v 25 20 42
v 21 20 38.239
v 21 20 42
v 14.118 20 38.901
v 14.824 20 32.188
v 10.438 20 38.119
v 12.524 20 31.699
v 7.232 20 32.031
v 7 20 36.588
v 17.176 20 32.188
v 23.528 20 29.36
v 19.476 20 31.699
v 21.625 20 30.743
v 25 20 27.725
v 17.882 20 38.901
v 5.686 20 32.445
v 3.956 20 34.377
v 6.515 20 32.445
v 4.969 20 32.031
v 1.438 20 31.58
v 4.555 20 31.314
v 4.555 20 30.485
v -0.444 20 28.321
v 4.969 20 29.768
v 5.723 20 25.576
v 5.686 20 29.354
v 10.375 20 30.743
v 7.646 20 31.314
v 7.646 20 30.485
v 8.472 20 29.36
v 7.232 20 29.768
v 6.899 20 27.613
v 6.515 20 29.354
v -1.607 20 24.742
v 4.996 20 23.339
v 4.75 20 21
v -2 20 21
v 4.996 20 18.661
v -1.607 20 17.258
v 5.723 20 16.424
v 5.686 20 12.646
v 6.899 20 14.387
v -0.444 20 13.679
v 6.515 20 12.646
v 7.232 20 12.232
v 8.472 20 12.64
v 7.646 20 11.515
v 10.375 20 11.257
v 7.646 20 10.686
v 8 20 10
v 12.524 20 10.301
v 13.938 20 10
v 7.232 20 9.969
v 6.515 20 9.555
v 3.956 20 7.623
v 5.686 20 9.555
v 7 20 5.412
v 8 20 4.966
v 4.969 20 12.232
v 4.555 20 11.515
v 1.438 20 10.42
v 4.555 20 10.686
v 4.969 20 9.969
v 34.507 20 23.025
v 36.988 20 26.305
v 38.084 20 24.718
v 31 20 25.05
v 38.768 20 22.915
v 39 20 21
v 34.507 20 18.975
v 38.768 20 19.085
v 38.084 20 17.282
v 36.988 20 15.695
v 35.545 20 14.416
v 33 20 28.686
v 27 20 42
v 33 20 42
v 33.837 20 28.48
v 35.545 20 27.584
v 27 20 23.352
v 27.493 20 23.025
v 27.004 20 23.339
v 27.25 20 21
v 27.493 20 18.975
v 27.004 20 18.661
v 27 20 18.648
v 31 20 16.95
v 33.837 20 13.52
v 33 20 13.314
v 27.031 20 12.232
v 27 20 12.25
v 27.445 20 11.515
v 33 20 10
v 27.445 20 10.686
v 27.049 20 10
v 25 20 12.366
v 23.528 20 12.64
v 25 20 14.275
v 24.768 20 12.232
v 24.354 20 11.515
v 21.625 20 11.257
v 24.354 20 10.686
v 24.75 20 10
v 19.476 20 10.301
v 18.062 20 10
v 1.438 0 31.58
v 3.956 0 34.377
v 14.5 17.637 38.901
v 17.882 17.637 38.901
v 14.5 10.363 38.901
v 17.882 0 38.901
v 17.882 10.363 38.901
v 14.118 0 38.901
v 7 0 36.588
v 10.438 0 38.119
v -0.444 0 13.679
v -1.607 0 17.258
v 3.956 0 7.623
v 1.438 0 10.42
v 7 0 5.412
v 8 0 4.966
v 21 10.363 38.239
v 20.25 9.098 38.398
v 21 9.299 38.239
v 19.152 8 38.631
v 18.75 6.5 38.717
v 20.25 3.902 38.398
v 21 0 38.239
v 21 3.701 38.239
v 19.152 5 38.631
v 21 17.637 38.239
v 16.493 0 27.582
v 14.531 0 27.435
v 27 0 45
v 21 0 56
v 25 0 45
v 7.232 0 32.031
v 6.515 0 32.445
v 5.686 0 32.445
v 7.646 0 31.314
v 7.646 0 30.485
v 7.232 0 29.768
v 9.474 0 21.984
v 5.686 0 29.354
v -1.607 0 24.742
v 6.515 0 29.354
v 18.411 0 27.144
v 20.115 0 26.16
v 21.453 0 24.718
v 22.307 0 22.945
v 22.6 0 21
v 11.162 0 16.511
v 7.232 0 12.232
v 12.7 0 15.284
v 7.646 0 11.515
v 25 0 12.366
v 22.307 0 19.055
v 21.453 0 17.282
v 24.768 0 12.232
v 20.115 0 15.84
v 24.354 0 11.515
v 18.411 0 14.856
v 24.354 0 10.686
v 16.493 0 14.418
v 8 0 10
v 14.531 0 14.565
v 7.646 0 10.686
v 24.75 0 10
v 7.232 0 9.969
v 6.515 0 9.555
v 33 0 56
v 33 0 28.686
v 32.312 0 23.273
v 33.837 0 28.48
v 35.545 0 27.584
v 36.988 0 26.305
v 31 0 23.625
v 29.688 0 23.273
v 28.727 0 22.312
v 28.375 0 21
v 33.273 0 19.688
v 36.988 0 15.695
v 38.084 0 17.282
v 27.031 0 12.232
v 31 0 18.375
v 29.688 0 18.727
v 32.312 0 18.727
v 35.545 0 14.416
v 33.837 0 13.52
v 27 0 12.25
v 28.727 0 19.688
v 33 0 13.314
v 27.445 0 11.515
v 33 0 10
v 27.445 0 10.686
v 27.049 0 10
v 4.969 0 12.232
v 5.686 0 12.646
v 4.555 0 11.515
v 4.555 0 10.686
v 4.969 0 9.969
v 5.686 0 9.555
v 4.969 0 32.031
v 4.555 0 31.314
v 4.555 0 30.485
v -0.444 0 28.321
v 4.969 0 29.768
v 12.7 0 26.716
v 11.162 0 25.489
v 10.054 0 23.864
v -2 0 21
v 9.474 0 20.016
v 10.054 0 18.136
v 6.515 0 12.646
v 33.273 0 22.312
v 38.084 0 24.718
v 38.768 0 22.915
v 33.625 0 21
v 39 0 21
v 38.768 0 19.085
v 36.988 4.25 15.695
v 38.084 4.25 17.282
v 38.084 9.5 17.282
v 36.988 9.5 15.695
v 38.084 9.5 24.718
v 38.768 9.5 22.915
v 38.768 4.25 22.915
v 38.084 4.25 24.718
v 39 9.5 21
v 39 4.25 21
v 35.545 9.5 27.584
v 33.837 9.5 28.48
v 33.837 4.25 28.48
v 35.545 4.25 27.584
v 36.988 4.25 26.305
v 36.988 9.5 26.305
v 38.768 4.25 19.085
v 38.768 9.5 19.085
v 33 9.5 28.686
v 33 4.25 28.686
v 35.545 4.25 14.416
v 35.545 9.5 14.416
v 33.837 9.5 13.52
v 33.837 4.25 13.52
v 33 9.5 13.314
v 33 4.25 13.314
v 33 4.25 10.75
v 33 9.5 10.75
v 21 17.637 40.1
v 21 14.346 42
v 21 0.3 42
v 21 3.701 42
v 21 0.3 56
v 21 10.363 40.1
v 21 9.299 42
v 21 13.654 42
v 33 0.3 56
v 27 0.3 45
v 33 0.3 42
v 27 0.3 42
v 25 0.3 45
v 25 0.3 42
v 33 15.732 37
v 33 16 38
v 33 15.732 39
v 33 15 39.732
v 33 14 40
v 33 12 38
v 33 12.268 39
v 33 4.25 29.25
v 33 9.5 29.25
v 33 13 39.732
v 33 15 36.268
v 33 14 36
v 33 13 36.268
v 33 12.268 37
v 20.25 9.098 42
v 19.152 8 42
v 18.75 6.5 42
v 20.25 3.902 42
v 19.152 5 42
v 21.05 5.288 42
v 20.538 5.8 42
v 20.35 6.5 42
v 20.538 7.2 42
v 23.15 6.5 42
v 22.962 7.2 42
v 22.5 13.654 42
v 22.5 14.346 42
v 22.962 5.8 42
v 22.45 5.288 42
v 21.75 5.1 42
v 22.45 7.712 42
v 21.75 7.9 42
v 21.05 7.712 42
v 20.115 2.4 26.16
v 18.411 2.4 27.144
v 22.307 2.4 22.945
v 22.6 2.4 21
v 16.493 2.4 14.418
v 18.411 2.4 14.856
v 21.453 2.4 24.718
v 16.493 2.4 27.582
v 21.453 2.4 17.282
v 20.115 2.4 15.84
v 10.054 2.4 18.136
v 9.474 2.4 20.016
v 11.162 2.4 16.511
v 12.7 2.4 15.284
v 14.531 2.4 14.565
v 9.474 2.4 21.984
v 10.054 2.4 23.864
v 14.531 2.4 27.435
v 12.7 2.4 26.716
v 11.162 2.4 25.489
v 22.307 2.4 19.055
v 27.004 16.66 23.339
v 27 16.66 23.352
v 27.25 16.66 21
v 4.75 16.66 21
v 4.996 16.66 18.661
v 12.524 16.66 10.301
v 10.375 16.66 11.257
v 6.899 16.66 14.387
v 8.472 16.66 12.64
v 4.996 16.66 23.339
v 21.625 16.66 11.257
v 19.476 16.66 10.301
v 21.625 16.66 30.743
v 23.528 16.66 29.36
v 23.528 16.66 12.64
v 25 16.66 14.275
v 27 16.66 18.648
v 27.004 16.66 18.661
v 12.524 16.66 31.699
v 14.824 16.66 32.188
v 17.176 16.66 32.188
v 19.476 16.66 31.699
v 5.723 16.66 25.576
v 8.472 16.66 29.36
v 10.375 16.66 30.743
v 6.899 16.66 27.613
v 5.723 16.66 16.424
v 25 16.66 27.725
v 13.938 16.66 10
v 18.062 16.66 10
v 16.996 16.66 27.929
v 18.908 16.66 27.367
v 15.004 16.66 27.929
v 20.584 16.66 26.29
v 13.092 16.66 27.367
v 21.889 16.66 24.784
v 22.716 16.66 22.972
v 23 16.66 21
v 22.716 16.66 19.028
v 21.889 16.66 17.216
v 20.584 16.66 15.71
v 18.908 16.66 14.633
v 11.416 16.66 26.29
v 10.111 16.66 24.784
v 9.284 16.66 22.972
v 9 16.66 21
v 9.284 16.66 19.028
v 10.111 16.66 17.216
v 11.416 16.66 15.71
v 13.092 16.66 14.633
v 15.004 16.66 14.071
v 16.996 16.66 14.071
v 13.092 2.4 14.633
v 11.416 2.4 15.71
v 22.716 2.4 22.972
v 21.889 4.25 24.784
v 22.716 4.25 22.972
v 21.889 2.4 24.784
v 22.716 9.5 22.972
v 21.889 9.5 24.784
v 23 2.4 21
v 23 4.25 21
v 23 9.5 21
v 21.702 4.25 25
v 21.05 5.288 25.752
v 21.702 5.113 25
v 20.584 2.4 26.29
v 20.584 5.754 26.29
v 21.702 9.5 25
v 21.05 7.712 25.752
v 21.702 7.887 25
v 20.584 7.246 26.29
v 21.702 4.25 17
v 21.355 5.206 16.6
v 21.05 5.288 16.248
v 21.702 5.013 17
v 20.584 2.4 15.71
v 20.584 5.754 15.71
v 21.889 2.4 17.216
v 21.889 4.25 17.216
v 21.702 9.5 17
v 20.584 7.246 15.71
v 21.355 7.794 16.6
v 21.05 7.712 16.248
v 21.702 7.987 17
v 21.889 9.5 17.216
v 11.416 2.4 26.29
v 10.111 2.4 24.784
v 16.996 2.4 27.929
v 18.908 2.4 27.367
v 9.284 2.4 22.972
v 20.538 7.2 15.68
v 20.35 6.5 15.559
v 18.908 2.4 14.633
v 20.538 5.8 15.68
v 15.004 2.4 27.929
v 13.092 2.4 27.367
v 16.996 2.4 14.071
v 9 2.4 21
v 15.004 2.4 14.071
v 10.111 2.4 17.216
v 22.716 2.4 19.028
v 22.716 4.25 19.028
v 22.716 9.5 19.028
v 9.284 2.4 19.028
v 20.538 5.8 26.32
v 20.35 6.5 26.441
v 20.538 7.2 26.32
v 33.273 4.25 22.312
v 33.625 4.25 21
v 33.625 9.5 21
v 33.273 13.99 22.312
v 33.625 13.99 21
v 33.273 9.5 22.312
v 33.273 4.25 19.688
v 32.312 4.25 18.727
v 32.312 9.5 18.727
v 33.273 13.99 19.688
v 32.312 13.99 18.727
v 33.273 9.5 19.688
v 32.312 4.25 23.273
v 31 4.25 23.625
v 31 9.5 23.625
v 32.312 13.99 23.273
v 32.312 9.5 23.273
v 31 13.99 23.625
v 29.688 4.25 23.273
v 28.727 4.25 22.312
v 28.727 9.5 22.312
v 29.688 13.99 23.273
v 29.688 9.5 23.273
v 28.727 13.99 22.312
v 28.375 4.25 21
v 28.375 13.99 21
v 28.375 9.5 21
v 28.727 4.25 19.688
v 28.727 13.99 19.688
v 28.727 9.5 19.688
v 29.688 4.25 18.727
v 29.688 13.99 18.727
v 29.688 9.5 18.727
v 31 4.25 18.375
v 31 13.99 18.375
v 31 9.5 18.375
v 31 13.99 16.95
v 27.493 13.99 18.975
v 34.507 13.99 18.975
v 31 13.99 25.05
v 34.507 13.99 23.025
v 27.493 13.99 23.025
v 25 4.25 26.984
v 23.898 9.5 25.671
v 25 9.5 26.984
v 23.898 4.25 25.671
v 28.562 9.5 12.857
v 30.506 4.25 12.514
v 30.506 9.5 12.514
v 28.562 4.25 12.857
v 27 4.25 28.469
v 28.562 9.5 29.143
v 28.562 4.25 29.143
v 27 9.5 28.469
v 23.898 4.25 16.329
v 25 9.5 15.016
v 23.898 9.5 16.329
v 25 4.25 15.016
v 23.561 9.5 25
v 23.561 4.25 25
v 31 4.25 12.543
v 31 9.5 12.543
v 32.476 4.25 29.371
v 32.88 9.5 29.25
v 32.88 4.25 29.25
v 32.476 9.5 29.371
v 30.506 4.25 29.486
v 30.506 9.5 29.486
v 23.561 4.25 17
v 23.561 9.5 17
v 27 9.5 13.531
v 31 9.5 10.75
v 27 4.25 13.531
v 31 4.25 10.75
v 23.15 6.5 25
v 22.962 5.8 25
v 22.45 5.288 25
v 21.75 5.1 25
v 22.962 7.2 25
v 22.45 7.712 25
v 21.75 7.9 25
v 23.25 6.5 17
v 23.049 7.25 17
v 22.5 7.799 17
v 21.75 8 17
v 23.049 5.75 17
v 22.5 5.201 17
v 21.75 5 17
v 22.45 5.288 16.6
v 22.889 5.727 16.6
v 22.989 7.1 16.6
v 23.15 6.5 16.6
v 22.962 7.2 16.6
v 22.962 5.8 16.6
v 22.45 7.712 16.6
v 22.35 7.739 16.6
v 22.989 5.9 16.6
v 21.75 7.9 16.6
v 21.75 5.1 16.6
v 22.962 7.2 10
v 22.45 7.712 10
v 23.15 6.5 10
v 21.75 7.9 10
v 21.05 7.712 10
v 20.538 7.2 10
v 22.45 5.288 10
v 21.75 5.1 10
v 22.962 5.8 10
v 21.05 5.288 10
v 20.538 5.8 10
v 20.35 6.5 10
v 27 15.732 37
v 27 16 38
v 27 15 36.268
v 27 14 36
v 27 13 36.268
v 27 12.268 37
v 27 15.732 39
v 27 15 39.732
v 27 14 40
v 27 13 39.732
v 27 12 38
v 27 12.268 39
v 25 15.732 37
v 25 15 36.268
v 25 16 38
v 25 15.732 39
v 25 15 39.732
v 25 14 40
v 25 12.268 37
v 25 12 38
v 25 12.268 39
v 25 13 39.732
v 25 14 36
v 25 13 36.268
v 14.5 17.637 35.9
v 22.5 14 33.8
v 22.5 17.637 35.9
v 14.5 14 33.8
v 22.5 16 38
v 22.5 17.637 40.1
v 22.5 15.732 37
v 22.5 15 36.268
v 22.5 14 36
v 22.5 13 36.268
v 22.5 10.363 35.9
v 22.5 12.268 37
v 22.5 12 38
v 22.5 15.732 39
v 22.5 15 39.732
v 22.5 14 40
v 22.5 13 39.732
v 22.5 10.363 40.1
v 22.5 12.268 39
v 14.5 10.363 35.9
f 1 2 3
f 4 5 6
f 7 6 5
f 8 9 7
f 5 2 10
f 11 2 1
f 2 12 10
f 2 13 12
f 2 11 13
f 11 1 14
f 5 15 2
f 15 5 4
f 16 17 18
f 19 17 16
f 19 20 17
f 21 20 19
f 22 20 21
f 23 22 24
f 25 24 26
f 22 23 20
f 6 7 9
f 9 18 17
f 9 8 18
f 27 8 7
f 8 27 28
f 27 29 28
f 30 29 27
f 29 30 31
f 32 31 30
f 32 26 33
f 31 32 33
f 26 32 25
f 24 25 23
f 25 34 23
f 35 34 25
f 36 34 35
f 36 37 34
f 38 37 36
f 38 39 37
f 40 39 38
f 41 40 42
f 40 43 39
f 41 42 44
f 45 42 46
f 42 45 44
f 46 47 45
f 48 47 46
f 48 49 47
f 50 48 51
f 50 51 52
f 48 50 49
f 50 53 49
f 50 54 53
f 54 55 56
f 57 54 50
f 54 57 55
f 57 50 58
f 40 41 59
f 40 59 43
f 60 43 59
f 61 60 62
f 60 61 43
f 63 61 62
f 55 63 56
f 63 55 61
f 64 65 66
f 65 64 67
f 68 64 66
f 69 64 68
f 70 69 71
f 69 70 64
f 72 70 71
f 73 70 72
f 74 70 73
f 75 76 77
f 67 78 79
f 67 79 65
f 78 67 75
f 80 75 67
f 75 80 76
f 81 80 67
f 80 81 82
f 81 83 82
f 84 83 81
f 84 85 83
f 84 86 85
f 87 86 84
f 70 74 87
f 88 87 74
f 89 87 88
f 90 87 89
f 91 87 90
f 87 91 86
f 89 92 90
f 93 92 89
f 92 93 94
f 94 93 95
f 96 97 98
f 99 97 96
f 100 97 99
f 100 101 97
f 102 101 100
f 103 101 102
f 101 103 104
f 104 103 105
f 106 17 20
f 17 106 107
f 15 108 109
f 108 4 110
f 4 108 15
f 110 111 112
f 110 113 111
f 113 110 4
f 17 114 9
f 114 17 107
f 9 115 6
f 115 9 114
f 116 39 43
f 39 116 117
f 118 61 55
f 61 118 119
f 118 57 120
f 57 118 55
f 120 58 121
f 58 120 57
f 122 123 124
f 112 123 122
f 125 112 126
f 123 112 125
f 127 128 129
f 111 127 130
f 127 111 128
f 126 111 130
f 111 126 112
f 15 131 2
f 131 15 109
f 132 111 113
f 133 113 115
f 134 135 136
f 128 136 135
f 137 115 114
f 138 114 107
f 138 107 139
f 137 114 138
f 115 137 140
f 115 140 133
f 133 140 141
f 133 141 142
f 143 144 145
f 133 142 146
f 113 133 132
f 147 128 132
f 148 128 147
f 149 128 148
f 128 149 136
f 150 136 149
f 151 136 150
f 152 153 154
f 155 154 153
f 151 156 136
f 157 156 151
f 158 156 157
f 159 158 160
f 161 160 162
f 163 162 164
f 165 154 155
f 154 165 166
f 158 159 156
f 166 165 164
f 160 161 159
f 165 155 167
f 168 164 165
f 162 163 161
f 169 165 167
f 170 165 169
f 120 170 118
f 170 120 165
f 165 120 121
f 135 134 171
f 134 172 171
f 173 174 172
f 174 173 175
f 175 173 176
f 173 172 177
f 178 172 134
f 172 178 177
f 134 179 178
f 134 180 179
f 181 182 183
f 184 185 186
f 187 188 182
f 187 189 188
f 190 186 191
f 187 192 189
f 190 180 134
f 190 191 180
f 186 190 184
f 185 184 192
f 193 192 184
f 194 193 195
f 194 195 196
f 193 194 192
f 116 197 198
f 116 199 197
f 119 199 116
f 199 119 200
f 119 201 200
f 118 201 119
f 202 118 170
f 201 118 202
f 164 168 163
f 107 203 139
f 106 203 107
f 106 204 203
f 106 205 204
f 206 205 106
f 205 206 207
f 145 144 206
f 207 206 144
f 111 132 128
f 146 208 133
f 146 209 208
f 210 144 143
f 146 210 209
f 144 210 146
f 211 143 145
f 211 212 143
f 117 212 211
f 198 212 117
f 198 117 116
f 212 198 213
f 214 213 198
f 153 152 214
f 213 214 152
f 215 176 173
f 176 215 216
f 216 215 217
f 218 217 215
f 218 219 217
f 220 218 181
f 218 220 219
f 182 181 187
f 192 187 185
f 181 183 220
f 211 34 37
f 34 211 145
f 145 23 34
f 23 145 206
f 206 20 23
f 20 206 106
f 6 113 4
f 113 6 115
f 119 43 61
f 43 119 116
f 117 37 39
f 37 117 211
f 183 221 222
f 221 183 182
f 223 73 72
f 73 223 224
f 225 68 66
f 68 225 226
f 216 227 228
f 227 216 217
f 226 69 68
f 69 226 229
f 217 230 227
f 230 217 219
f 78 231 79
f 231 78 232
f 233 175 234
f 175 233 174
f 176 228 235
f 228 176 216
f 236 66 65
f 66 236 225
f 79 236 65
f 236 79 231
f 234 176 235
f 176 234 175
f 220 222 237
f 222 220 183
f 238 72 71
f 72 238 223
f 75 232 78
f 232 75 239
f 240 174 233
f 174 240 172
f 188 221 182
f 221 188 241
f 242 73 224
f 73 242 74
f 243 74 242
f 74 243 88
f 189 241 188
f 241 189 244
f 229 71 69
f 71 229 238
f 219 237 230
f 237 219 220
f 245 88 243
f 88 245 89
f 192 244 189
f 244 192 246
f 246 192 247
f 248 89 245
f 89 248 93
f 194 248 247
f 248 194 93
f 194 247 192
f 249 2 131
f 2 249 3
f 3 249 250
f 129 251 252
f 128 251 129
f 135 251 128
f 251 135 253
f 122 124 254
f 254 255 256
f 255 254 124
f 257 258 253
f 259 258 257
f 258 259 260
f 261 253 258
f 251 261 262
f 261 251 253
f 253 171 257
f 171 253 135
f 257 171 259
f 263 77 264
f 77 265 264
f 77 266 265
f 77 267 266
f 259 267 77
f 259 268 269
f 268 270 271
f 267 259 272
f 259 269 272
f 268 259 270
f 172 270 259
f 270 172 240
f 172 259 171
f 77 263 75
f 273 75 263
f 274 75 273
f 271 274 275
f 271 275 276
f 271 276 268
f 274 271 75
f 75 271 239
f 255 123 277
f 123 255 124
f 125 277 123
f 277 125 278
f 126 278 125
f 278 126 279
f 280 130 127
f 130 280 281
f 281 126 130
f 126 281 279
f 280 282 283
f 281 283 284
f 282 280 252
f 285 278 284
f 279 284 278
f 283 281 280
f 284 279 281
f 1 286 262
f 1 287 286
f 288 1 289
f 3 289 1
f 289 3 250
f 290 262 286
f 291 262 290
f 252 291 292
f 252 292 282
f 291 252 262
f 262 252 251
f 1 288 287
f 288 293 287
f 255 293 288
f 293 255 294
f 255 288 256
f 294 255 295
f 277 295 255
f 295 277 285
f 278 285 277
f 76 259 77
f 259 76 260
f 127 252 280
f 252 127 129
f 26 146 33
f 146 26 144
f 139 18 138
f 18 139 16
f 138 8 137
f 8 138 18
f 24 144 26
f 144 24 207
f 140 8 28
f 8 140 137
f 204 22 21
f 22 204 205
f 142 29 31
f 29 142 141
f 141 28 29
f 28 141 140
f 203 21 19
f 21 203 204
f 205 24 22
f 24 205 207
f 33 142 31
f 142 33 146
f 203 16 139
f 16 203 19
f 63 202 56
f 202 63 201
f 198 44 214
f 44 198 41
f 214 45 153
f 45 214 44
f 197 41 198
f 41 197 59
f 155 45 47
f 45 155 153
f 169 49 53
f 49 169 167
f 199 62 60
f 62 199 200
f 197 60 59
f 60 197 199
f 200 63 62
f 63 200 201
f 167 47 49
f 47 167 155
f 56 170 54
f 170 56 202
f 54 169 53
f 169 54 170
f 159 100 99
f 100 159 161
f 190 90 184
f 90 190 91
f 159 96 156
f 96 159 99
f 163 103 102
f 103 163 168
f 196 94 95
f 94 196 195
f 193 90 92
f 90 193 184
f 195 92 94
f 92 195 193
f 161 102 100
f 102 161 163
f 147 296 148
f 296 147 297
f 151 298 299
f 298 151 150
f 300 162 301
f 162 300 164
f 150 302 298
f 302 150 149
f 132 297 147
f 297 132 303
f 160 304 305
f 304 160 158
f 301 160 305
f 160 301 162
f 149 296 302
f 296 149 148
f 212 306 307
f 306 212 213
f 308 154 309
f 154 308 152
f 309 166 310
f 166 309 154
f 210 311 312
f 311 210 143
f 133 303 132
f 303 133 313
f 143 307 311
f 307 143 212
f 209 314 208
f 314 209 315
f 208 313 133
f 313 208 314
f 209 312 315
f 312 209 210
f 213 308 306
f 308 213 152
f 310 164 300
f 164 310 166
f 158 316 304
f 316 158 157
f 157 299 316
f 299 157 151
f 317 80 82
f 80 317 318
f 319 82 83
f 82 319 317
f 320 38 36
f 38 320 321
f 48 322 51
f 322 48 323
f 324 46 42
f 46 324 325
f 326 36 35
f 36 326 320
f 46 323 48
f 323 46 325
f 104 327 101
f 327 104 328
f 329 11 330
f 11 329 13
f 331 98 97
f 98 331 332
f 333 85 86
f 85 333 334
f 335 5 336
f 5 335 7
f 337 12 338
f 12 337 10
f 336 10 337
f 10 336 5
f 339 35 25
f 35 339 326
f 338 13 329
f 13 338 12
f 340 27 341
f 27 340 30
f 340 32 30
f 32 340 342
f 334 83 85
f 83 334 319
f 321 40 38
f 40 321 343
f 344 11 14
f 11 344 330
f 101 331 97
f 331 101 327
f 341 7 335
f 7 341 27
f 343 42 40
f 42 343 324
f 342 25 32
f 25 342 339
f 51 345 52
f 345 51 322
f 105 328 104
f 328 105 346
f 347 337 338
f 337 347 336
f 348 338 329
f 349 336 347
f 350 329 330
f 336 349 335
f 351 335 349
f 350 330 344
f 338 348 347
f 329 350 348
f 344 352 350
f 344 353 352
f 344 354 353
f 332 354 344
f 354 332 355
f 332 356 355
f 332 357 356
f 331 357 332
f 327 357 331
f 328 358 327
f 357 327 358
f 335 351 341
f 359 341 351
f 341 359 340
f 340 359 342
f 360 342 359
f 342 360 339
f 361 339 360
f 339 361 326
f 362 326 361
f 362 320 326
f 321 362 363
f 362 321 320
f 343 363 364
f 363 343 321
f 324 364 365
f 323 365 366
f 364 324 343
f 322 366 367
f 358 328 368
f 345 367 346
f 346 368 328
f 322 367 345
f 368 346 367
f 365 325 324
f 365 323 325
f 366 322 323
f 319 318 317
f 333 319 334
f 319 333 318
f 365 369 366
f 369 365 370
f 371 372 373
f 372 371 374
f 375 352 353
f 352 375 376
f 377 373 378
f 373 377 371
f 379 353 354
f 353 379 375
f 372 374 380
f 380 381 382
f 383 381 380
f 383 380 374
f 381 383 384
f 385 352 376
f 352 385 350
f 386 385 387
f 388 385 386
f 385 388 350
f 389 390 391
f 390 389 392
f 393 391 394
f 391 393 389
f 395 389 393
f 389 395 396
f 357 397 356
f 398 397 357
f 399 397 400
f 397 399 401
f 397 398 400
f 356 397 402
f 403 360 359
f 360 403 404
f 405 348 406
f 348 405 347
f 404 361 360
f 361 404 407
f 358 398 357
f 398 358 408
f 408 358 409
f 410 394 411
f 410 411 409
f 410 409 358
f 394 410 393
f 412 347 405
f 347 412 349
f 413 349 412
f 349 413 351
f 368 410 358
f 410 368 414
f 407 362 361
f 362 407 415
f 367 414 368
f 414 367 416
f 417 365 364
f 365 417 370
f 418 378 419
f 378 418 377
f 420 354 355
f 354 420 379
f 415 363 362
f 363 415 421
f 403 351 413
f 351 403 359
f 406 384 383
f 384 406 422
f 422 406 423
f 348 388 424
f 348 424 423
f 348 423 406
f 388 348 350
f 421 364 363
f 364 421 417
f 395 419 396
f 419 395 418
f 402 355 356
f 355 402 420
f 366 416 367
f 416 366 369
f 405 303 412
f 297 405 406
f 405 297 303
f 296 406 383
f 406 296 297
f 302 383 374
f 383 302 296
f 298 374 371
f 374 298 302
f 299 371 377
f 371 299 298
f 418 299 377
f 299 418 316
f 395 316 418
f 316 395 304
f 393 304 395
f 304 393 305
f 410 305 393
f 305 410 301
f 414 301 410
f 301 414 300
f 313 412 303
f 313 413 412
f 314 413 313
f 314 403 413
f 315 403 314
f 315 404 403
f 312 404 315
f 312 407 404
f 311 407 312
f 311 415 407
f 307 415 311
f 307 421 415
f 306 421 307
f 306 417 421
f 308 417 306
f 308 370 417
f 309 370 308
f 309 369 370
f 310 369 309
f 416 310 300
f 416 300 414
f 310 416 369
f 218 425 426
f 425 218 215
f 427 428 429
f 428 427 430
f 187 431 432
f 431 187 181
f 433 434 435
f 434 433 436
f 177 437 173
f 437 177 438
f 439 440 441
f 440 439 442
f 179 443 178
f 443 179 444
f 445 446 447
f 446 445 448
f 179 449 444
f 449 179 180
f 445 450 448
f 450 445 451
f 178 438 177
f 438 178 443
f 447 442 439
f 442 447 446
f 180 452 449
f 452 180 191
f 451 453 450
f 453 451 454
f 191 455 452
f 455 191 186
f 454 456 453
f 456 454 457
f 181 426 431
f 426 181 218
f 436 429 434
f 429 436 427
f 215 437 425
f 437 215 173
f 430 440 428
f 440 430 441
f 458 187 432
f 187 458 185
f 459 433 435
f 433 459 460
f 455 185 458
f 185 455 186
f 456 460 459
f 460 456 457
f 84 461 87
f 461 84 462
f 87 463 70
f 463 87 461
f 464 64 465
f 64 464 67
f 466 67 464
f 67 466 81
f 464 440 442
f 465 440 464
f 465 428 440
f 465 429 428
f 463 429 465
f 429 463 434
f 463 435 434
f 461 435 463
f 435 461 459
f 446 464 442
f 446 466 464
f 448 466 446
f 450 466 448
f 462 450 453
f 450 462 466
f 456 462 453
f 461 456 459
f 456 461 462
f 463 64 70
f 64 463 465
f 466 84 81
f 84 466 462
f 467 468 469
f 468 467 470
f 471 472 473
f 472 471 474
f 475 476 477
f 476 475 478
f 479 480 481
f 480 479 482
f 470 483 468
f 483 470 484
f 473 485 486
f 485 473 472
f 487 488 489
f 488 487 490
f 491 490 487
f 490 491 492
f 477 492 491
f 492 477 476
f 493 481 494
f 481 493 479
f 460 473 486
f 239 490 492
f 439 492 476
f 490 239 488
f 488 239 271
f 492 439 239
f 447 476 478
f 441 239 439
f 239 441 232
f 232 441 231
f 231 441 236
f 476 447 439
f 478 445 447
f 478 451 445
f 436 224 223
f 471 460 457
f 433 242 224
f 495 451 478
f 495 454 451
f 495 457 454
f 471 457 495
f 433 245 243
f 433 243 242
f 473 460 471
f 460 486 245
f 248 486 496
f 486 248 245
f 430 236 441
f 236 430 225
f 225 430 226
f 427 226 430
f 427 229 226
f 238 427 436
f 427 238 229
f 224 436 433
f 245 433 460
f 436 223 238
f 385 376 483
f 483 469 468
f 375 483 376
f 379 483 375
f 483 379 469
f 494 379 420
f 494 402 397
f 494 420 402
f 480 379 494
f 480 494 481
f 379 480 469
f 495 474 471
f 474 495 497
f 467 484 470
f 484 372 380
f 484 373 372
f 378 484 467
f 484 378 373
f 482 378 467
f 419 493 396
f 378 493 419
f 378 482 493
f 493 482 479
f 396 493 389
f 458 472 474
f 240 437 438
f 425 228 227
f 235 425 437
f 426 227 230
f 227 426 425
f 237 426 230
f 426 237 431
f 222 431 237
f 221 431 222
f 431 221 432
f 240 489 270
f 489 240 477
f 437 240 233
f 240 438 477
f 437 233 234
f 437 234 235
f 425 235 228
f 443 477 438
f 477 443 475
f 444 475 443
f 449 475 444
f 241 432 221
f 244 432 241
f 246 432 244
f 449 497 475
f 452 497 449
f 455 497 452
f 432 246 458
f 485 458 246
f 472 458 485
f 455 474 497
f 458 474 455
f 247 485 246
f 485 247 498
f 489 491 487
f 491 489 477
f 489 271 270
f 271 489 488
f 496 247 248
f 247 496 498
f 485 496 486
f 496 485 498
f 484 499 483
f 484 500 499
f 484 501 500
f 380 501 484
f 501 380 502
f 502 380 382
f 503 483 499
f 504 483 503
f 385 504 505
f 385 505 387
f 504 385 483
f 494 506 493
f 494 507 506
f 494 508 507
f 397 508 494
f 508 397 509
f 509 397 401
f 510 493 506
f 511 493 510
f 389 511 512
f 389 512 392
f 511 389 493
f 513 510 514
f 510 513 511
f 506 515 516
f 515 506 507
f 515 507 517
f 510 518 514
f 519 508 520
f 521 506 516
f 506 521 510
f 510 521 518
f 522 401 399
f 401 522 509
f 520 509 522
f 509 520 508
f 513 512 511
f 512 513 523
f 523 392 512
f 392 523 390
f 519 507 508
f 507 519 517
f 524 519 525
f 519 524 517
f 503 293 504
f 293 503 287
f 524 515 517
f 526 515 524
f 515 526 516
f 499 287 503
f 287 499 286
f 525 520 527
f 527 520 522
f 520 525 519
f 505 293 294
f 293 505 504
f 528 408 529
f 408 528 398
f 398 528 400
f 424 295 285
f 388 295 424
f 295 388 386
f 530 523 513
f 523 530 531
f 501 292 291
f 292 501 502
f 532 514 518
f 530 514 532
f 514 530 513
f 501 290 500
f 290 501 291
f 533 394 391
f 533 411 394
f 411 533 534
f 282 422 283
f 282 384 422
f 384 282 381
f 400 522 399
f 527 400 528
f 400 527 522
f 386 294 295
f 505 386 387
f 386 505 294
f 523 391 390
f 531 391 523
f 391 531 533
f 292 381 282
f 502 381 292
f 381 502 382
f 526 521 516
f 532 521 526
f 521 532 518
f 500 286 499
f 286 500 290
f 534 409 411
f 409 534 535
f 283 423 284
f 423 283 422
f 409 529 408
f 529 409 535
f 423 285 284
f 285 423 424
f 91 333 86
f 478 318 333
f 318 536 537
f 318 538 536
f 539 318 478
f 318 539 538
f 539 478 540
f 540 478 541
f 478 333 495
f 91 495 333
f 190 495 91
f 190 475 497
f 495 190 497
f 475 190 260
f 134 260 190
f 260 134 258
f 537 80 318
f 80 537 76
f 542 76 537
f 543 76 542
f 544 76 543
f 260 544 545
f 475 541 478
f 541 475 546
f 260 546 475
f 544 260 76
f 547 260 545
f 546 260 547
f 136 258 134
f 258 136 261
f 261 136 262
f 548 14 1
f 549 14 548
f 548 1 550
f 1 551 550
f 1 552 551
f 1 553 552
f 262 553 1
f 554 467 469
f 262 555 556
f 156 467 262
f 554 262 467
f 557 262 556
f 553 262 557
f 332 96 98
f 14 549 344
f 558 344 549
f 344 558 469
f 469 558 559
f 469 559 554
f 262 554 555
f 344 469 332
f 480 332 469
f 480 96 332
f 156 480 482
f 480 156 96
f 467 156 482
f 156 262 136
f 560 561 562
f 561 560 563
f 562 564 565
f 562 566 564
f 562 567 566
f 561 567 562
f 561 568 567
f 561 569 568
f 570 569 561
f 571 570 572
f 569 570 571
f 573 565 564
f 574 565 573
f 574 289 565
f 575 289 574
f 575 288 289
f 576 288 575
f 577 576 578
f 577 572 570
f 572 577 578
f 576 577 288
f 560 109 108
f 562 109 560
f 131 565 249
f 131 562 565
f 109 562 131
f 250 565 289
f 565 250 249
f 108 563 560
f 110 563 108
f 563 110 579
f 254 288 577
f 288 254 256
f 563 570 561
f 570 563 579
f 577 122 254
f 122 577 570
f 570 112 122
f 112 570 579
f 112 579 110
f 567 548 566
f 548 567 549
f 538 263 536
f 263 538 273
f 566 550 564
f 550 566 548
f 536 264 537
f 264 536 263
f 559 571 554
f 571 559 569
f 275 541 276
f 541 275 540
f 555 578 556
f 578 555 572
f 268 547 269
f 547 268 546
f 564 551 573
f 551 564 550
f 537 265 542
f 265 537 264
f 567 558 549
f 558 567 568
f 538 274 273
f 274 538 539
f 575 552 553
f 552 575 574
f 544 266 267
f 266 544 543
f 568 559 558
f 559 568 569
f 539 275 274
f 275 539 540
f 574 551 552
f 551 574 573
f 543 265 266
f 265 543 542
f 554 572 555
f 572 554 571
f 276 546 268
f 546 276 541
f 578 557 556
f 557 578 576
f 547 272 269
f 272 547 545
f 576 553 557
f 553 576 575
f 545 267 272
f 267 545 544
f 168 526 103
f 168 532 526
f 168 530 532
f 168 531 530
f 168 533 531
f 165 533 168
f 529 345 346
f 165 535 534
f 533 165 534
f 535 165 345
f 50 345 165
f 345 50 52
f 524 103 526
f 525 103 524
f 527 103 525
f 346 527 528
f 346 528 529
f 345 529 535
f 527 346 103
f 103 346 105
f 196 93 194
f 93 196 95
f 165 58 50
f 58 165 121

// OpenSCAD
first_layer = 0.3;

difference() {
	
	union() {
		//main cylinder
		translate([16,20,21]) rotate([90,0,0]) cylinder(h=20, r=18);//cube([44, 20, 42]);
		
		//bearing mount
		translate([31,20,21]) rotate([90,0,0]) cylinder (h=20, r=8);
		
		//V3 Mount
		translate([9,0,-7]) cube([24, 20, 22]);
		translate([21,first_layer/2,-11]) rotate([90,0,0]) cube([24, 22, first_layer], center=true);
		translate([27,first_layer/2,45]) rotate([90,0,0]) cube([12, 22, first_layer], center=true);
		
		//filament support
		translate([21.75,6.5,34]) rotate([0,0,0]) cylinder (h=8, r=3, $fn=12);
		
		//groovemount supports
//		translate([33,6.5,-7]) rotate([0,0,0]) cylinder (h=16, r=5, $fn=12);
//		translate([9,6.5,-7]) rotate([0,0,0]) cylinder (h=16, r=5, $fn=12);
		
		//clamp
		translate([21,0,28]) cube([12, 20, 14]);
	}
	
	//pulley opening
	translate([16,21,21]) rotate([90,0,0]){
		cylinder (h=22, r=6.6);
		
		rotate([0,0,45]) {
		//translate([14,0,0]) cylinder(h=22, r=1.6, $fn=12);
		translate([0,14,0]) cylinder(h=22, r=1.6, $fn=12);
		translate([-14,0,0]) cylinder(h=22, r=1.6, $fn=12);
		translate([0,-14,0]) cylinder(h=22, r=1.6, $fn=12);
		}
	}
	
	//gearhead indentation
	translate([16,20.01,21]) rotate([90,0,0]) cylinder (h=3.35, r=11.25);

	//pulley hub indentation
	translate([16,20-2,21]) rotate([90,0,0]) cylinder (h=15.6, r=7);
	
	//bearing screws
	translate([31,21,21]) rotate([90,0,0]) cylinder (h=22, r=2.625, $fn=12); //precision m5
	//translate([31,21,21]) rotate([90,0,0]) cylinder (h=22, r=2.6, $fn=12); //regular M5 screw
	translate([31,22,21]) rotate([90,30,0]) cylinder (h=8.01, r=8.1/2, $fn=6); //M4
	//#translate([31,22,21]) rotate([90,30,0]) cylinder (h=8.01, r=4.7, $fn=6); //M5
	
	//bearing
	translate([31,9.5,21]) rotate([90,0,0]) cylinder (h=5.25, r=8.5);
	translate([31,9.5-5.25,21-8.25-2]) cube([20, 5.25, 18.5]);
	//opening between bearing and pulley
	translate([20,9.5-5.25,21-8.25+3.25+1]) cube([10, 5.25, 8]);

	//filament path chamfer
	translate([21.75,6.5,15]) rotate([0,0,0]) cylinder (h=2, r1=1, r2=1.5, $fn=12);		
	
	//filament path
	translate([21.75,6.5,-10]) rotate([0,0,0]) cylinder (h=60, r=1.4, $fn=12); 
	
	//V3 Mount
//	translate([21.75,6.5,-2]) rotate([0,0,0]) cylinder (h=5, r=8.25);
	translate([21.75,6.5,-7]) rotate([0,0,0]) cylinder (h=8, r=4.5);
//	translate([21.75-8,6.5-8,-2]) cube([16, 8, 5]);
//	translate([21.75-6,6.5-7,-7]) cube([12, 7, 5]);
translate([21.75,6.5,3.5]) rotate([90,0,0]) cylinder (h=10, r=1,  $fn=12);
	
	//groovemount supports
//	translate([33,6.5,-8]) rotate([0,0,0]) cylinder (h=20, r=1.6, $fn=12);
//	translate([33,6.5,7]) rotate([0,0,0]) cylinder (h=3, r=3.5, $fn=6);

//	translate([9,6.5,-8]) rotate([0,0,0]) cylinder (h=20, r=1.6, $fn=12);
//	translate([9,6.5,7]) rotate([0,0,0]) cylinder (h=3, r=3.5, $fn=6);
//	translate([3,3,7]) cube([8, 7, 3]);
	
	//clamp slit
	translate([25,-1,10]) cube([2, 22, 35]);
	//clamp nut
	translate([14.5,14,38]) rotate([0,90,0]) cylinder (h=8, r=4.2, $fn=6);
	//clamp screw hole
	translate([17,14,38]) rotate([0,90,0]) cylinder (h=17, r=2, $fn=12);
	
	translate([8,-2,-25])cube(35,20,10);
}
